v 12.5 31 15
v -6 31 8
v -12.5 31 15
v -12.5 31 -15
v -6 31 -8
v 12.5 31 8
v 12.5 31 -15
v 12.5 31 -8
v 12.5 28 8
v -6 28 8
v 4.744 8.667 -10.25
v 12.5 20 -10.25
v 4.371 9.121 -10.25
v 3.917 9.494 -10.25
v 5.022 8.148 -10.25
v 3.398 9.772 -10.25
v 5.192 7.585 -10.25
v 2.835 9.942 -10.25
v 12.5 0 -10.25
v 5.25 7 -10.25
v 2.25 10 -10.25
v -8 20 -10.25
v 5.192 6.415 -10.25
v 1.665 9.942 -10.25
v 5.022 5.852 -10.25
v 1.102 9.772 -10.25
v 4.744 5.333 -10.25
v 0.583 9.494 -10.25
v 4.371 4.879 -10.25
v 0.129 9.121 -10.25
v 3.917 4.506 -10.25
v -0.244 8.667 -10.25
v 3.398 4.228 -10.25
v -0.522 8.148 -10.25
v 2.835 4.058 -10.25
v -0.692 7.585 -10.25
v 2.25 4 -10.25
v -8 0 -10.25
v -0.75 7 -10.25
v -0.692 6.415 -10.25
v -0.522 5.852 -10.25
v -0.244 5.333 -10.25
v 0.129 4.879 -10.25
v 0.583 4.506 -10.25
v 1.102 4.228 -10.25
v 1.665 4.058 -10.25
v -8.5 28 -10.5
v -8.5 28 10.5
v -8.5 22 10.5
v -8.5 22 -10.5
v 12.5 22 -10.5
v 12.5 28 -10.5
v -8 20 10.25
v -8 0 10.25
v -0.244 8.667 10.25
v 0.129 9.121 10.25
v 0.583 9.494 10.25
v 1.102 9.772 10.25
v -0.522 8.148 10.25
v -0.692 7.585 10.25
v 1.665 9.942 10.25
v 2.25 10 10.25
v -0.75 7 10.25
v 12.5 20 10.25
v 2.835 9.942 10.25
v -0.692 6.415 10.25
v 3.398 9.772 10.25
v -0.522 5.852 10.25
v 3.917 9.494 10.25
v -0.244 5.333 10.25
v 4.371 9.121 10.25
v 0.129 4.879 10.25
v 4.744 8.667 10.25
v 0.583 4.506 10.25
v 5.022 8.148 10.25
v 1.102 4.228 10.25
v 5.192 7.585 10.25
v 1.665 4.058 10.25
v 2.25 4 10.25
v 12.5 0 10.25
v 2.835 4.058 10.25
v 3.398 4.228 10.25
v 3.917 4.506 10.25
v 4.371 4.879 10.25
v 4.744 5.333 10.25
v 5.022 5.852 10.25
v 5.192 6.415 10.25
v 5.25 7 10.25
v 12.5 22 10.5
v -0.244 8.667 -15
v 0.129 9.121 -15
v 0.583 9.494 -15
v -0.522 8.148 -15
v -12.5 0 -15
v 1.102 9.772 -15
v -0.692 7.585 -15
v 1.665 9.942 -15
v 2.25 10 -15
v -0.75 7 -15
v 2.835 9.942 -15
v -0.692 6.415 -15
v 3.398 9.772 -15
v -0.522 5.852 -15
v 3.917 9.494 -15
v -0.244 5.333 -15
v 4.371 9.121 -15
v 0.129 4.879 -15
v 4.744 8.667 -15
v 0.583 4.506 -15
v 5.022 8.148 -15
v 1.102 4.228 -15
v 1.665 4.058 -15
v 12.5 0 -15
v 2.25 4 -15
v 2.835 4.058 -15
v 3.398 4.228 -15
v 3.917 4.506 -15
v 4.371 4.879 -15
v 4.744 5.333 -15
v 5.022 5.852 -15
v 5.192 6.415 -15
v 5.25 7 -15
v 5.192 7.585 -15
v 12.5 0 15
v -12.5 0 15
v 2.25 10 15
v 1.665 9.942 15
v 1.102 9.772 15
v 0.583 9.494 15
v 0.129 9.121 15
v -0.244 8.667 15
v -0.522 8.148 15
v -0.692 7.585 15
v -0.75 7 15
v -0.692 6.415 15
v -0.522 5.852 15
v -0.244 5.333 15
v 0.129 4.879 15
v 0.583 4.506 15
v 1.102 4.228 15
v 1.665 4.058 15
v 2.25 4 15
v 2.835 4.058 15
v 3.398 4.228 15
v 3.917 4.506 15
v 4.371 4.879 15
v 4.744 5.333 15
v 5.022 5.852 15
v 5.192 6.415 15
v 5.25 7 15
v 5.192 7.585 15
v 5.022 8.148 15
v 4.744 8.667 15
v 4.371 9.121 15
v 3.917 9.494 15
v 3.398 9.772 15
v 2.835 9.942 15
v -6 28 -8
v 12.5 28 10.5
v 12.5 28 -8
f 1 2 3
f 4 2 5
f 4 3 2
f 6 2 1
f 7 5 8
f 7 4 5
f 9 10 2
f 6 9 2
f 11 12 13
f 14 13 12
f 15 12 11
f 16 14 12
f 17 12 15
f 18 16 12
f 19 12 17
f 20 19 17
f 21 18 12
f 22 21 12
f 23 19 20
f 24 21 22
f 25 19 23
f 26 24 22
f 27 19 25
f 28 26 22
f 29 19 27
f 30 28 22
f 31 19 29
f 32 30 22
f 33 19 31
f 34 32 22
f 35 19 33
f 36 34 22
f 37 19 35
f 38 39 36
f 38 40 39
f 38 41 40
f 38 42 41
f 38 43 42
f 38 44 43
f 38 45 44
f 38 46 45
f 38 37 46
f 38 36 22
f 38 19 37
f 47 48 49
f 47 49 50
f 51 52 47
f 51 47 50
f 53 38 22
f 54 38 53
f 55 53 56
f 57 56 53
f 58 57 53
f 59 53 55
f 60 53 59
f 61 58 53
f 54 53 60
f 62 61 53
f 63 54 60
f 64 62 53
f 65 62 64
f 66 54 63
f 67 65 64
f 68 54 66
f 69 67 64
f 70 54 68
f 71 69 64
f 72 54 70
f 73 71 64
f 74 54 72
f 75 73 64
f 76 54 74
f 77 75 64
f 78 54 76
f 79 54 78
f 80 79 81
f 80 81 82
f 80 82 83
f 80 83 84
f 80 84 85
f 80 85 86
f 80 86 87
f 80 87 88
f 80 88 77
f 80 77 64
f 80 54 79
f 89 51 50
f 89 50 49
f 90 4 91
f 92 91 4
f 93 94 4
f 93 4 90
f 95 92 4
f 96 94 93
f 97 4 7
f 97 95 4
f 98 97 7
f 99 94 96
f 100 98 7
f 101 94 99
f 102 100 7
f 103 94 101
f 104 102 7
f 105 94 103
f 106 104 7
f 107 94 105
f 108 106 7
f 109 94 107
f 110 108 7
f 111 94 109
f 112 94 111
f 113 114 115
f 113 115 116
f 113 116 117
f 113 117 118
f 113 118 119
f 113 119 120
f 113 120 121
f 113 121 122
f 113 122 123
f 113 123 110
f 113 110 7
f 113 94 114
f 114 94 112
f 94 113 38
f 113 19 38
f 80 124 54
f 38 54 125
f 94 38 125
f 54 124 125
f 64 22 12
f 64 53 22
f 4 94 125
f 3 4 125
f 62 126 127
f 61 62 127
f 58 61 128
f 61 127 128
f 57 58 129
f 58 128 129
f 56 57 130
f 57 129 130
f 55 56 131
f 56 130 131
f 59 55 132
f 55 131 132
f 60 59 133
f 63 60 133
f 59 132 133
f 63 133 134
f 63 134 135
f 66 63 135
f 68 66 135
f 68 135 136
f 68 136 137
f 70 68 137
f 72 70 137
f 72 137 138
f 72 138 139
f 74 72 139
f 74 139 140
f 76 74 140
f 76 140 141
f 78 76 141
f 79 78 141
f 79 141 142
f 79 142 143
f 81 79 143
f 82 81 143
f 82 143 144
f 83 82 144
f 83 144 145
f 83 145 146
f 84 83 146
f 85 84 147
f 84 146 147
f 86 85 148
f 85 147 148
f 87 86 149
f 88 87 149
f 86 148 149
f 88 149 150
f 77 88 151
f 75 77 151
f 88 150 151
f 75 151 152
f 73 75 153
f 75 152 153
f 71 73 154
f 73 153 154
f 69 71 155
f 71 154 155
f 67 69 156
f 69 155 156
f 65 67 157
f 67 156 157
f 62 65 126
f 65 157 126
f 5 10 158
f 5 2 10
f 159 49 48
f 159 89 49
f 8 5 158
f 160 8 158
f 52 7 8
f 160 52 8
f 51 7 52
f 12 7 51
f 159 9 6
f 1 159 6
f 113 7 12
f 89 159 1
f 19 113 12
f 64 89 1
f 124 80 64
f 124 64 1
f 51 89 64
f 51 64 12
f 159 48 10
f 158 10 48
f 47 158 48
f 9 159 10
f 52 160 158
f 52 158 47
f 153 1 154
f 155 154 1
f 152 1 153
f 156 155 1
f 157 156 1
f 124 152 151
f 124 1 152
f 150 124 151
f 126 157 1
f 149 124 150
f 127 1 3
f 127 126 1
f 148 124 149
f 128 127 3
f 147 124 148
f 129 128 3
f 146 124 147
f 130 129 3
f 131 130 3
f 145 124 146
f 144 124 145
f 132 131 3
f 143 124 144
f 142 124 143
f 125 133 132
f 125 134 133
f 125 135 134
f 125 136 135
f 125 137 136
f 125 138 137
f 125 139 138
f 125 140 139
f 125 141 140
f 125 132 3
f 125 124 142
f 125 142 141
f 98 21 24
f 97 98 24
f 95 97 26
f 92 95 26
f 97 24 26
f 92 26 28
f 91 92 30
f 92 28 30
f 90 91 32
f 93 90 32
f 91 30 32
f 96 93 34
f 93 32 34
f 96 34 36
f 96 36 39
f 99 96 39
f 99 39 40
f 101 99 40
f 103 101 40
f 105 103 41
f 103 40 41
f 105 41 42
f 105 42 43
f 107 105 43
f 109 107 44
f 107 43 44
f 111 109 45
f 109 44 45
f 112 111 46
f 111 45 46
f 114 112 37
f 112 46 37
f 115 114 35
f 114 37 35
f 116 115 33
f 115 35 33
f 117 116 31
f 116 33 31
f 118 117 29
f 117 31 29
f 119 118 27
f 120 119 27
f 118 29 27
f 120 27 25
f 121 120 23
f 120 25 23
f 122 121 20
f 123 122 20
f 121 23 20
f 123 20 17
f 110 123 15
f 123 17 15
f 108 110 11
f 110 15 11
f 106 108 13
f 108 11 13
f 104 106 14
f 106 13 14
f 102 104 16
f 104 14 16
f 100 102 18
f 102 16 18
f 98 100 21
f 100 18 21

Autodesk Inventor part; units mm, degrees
ref_plane "YZ Plane" through (0, 0, 0) normal (1, 0, 0) x (0, 1, 0)
ref_plane "XZ Plane" through (0, 0, 0) normal (0, 1, 0) x (-1, 0, 0)
ref_plane "XY Plane" through (0, 0, 0) normal (0, 0, 1) x (1, 0, 0)
sketch "スケッチ1" plane through (0, 0, 0) normal (0, 1, 0) x (-1, 0, 0)
  line L0 (-12.5, -15) -> (12.5, -15)
  line L1 (12.5, -15) -> (12.5, 15)
  line L2 (12.5, 15) -> (-12.5, 15)
  line L3 (-12.5, 15) -> (-12.5, -15)
  line L4 (-12.5, -15) -> (12.5, 15) construction
  line L5 (12.5, -15) -> (-12.5, 15) construction
  point P0 (0, 0)
  dimension "d0" = 25
  dimension "d1" = 30
extrude "押し出し1" add sketch "スケッチ1" along normal blind 25
sketch "スケッチ2" plane through (0, 0, 0) normal (0, -1, 0) x (1, 0, 0)
  line L0 (12.5, 15) -> (12.5, -15) projected
  line L1 (12.5, -10.25) -> (-8, -10.25)
  line L2 (-8, -10.25) -> (-8, 10.25)
  line L3 (-8, 10.25) -> (12.5, 10.25)
  line L4 (12.5, 10.25) -> (12.5, -10.25)
  line L5 (12.5, -15) -> (-12.5, -15) projected
  point P0 (0, 0)
  point P1 (12.5, 10.25)
  dimension "d4" = 20.5
  dimension "d5" = 20.5
  dimension "d22" = 10.25
extrude "押し出し2" cut sketch "スケッチ2" against normal blind 20
sketch "スケッチ4" plane through (12.5, 0, -15) normal (0, 0, -1) x (-1, 0, 0)
  line L0 (0, 0) -> (25, 0) projected
  line L1 (0, 0) -> (0, 25) projected
  point P0 (12.5, 0)
  point P1 (10.25, 7)
  dimension "d12" = 7
  dimension "d13" = 10.25
hole "穴1" at (2.25, 7, -15) direction (0, 0, 1) diameter 6 end through all
sketch "スケッチ6" plane through (0, 25, 0) normal (0, 1, 0) x (1, 0, 0)
  line L0 (-12.5, 15) -> (-12.5, -15) projected
  line L1 (12.5, -15) -> (12.5, -10.25) projected
  line L2 (-12.5, 15) -> (12.5, 15)
  line L3 (12.5, 15) -> (12.5, -15)
  line L4 (12.5, -15) -> (-12.5, -15)
  line L5 (-12.5, -15) -> (-12.5, 15)
  point P0 (0, 0)
extrude "押し出し5" add sketch "スケッチ6" along normal blind 6
sketch "スケッチ8" plane through (12.5, 0, -10.25) normal (1, 0, 0) x (0, 0, -1)
  line L0 (-20.75, 28) -> (0.25, 28)
  line L1 (0.25, 28) -> (0.25, 22)
  line L2 (0.25, 22) -> (-20.75, 22)
  line L3 (-20.75, 22) -> (-20.75, 28)
  line L4 (-20.5, 20) -> (0, 20) projected
  point P0 (-10.25, 0)
  dimension "d37" = 21
  dimension "d38" = 6
  dimension "d39" = 10.5
  dimension "d40" = 2
extrude "押し出し7" cut sketch "スケッチ8" against normal blind 21
sketch "スケッチ9" plane through (12.5, 0, -10.25) normal (1, 0, 0) x (0, 0, -1)
  line L0 (-18.25, 31) -> (-2.25, 31)
  line L1 (-2.25, 31) -> (-2.25, 28)
  line L2 (-2.25, 28) -> (-18.25, 28)
  line L3 (-18.25, 28) -> (-18.25, 31)
  line L4 (-25.25, 31) -> (4.75, 31) projected
  point P0 (-10.25, 0)
  dimension "d43" = 16
  dimension "d44" = 3
  dimension "d45" = 0
  dimension "d46" = 8
extrude "押し出し8" cut sketch "スケッチ9" against normal blind 18.5
properties part number "baseA"
